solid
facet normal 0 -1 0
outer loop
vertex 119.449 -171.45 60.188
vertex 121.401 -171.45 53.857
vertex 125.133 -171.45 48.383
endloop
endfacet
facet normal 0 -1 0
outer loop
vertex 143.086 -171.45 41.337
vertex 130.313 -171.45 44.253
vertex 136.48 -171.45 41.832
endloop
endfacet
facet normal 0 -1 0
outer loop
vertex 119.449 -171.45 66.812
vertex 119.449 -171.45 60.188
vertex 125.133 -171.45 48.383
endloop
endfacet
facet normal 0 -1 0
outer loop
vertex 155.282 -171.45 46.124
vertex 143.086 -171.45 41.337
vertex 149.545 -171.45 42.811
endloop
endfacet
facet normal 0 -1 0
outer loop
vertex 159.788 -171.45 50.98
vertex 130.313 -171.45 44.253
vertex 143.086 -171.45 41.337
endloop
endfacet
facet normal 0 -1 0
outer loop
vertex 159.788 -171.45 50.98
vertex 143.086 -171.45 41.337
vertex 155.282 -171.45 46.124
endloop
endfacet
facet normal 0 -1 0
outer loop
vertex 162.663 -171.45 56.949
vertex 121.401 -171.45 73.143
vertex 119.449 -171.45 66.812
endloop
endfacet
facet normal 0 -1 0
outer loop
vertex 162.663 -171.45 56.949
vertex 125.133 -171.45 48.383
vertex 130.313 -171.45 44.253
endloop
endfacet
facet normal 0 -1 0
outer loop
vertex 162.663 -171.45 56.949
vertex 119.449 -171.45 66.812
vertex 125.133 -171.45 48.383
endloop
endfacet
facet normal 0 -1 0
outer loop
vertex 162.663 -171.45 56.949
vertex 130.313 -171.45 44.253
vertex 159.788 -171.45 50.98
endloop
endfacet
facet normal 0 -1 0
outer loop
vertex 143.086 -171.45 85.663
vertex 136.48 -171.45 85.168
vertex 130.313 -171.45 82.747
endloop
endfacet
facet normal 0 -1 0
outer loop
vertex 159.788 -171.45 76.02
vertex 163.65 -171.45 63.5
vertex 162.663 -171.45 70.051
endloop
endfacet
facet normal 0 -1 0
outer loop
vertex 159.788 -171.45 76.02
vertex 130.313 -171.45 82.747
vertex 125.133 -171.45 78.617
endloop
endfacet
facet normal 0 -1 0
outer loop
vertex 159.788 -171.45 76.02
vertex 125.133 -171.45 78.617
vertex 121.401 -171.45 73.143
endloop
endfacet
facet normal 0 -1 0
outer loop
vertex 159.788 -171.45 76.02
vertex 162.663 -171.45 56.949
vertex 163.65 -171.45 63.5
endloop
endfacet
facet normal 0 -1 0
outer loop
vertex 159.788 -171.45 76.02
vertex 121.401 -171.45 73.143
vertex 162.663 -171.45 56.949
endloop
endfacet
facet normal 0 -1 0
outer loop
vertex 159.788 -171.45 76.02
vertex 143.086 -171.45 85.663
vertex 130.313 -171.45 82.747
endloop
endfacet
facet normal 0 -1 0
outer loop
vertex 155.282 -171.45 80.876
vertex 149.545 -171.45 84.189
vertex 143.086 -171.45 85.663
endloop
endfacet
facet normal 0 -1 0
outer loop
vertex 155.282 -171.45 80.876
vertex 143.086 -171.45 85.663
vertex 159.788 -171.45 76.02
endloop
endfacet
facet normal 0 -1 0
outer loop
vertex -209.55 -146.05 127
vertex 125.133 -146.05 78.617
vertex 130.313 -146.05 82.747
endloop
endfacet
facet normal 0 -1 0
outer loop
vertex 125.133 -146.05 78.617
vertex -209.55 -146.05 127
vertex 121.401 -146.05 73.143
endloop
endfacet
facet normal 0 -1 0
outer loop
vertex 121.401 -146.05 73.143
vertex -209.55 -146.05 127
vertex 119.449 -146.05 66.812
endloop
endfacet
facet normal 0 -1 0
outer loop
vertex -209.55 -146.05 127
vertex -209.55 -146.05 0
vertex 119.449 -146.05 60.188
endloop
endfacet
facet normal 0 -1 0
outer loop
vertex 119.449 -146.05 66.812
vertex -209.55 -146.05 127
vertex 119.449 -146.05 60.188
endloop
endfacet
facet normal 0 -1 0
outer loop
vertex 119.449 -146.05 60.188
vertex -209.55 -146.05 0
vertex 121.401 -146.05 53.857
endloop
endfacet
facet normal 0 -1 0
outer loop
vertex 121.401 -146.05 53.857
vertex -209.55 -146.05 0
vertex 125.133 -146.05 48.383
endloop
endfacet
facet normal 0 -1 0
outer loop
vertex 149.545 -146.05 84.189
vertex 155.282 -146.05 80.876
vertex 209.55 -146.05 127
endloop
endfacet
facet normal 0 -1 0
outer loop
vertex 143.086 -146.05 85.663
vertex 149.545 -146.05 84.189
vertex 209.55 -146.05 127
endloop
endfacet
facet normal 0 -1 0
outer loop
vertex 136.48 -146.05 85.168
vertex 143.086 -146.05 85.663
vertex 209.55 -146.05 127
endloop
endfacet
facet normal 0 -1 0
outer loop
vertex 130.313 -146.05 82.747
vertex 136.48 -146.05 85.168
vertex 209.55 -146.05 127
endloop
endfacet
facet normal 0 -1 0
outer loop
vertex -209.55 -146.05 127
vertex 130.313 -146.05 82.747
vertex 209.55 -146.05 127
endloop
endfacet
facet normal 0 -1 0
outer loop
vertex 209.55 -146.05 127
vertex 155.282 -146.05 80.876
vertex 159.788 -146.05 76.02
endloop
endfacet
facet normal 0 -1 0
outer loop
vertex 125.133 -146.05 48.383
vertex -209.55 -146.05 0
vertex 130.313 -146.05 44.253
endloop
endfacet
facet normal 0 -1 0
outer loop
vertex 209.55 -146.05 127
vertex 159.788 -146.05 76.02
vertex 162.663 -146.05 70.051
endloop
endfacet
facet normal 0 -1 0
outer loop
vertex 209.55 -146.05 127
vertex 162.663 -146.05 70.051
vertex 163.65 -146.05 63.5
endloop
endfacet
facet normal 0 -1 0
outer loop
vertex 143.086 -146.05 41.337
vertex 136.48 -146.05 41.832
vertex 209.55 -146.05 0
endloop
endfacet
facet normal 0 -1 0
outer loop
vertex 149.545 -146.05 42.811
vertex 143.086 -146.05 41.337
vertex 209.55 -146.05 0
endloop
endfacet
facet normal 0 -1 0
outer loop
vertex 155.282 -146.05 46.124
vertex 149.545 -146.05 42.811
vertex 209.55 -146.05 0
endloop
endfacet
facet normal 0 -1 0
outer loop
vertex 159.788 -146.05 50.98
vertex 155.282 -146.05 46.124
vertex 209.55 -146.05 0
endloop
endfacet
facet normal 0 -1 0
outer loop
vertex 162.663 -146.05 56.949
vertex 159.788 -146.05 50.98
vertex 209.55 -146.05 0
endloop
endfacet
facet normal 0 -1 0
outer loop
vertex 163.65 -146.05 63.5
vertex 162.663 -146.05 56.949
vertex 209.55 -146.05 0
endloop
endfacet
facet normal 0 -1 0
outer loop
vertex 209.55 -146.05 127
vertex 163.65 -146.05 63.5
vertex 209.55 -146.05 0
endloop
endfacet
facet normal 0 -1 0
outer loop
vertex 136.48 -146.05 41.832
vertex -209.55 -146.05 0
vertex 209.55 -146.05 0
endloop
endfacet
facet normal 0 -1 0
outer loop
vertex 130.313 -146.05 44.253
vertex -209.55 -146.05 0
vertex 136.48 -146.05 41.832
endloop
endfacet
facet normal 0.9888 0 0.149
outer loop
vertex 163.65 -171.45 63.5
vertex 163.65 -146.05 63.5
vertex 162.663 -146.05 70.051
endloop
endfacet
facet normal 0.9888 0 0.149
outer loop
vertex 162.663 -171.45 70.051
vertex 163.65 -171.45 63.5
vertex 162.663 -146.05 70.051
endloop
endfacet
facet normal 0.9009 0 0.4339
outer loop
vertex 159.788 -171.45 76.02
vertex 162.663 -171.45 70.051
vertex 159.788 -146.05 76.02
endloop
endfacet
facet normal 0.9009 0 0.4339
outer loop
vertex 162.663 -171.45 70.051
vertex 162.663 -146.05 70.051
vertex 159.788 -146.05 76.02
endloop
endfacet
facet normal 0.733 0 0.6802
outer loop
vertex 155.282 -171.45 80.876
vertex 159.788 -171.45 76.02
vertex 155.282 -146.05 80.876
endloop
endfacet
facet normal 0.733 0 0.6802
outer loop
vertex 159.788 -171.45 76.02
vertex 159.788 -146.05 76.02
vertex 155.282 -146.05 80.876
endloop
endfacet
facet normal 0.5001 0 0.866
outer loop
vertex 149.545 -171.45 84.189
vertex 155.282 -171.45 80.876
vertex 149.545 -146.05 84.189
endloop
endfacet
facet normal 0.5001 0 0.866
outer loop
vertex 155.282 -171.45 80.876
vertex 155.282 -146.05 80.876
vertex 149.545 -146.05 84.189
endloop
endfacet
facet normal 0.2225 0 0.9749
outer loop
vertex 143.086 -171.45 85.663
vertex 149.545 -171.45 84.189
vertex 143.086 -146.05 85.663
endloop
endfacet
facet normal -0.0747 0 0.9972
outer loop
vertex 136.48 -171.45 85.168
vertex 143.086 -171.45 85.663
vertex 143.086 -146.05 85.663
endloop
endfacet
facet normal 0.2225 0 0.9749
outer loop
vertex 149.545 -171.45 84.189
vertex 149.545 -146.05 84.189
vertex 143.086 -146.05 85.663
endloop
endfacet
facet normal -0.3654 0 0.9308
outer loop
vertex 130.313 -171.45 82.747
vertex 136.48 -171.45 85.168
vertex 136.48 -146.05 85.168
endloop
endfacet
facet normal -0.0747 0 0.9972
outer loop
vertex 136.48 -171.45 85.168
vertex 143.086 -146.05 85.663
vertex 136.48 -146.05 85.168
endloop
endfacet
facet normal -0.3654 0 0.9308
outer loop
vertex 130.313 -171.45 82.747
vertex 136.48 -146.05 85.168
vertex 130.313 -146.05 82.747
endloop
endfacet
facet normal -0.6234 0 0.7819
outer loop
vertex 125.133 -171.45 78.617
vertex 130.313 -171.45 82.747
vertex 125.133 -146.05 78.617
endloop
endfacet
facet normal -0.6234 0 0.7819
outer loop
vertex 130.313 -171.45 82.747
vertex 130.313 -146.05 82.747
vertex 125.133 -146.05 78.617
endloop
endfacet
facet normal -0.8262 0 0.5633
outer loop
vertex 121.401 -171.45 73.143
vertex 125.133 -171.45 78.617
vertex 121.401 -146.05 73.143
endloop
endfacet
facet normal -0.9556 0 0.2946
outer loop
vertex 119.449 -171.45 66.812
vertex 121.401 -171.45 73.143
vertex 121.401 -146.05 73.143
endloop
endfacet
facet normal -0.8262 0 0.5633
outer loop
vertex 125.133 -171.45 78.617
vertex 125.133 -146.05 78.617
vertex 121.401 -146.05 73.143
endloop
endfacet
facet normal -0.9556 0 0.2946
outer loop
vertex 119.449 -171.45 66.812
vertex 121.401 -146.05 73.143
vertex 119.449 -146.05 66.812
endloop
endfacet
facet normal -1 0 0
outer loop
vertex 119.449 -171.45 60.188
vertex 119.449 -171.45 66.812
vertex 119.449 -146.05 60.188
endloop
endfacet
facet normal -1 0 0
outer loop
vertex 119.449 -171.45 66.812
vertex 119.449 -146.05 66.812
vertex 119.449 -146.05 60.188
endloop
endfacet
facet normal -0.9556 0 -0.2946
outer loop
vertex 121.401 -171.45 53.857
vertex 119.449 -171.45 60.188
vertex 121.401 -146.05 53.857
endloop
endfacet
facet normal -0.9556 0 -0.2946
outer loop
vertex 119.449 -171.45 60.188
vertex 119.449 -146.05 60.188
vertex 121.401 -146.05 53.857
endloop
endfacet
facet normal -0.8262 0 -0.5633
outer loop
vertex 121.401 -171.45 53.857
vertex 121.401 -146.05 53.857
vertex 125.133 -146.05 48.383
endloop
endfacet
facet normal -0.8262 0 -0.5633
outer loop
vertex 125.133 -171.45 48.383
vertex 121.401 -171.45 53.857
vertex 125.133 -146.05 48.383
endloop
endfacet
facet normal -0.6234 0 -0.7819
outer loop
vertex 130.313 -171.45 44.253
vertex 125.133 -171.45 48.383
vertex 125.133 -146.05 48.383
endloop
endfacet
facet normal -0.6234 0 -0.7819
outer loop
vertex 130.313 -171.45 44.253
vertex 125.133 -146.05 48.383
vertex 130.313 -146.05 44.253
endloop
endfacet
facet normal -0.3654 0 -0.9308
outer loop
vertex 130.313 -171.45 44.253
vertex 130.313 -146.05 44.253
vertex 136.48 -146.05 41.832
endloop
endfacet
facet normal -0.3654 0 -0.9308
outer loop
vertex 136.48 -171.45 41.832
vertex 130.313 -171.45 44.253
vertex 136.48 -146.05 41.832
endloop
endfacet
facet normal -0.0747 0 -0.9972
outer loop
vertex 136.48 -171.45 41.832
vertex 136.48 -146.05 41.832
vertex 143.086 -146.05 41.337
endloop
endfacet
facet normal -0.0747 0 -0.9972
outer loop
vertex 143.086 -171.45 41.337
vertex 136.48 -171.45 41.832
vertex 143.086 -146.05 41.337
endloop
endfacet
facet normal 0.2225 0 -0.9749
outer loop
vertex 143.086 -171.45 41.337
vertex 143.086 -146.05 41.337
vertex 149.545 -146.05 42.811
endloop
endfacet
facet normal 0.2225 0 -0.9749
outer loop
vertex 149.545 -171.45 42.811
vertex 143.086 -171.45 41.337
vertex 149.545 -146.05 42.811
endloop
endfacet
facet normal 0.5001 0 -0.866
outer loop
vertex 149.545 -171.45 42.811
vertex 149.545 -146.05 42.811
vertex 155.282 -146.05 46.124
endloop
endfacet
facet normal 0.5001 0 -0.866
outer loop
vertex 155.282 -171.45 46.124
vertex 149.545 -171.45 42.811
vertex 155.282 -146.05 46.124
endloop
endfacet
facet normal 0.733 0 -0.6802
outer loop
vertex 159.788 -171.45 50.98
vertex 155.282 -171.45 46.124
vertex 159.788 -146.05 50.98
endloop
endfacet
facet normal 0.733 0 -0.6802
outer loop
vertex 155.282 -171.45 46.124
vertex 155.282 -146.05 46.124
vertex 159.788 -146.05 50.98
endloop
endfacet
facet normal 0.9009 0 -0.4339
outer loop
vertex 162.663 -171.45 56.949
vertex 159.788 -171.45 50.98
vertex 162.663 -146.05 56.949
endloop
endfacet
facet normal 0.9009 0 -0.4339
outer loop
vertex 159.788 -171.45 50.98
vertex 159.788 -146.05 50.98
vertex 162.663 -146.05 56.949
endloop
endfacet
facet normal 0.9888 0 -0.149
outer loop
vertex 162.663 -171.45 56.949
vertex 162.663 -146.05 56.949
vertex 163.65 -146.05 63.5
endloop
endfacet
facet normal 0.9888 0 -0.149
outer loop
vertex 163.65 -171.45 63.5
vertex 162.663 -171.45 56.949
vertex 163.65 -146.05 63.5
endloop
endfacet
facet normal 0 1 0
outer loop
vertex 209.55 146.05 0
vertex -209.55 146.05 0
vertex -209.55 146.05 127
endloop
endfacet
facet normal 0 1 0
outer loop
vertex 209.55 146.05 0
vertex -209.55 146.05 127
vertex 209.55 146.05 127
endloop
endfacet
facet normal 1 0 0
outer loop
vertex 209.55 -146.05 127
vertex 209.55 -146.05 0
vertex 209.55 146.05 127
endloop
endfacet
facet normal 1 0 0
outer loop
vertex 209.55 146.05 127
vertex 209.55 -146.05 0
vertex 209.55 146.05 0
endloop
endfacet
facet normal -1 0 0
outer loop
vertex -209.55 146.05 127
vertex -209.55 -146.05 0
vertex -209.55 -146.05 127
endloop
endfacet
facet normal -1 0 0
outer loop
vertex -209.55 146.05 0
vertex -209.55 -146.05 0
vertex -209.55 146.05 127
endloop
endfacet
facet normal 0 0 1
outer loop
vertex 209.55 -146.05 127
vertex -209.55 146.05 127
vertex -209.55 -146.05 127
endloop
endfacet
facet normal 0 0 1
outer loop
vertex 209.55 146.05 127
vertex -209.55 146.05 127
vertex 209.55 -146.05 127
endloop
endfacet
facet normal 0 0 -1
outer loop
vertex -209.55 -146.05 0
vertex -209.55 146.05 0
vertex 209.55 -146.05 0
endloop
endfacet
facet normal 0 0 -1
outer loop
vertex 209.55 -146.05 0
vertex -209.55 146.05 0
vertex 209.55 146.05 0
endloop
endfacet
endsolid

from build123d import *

# Parameters (mm, degrees)
F0_W     = 419.1
F0_H     = 292.1
F1_DEPTH = 127
F2_R     = 22.225
F3_DEPTH = 25.4


with BuildPart() as f1:
    # F0 (on Top) → F1 (new body)
    with BuildSketch(Plane.XY):
        Rectangle(F0_W, F0_H)
    extrude(amount=F1_DEPTH)

    # F2 (on face) → F3 (join)
    with BuildSketch(Plane.XZ.offset(146.05)):
        with Locations((141.425312, 63.5)):
            Circle(F2_R)
    extrude(amount=F3_DEPTH)


solid = f1.part
